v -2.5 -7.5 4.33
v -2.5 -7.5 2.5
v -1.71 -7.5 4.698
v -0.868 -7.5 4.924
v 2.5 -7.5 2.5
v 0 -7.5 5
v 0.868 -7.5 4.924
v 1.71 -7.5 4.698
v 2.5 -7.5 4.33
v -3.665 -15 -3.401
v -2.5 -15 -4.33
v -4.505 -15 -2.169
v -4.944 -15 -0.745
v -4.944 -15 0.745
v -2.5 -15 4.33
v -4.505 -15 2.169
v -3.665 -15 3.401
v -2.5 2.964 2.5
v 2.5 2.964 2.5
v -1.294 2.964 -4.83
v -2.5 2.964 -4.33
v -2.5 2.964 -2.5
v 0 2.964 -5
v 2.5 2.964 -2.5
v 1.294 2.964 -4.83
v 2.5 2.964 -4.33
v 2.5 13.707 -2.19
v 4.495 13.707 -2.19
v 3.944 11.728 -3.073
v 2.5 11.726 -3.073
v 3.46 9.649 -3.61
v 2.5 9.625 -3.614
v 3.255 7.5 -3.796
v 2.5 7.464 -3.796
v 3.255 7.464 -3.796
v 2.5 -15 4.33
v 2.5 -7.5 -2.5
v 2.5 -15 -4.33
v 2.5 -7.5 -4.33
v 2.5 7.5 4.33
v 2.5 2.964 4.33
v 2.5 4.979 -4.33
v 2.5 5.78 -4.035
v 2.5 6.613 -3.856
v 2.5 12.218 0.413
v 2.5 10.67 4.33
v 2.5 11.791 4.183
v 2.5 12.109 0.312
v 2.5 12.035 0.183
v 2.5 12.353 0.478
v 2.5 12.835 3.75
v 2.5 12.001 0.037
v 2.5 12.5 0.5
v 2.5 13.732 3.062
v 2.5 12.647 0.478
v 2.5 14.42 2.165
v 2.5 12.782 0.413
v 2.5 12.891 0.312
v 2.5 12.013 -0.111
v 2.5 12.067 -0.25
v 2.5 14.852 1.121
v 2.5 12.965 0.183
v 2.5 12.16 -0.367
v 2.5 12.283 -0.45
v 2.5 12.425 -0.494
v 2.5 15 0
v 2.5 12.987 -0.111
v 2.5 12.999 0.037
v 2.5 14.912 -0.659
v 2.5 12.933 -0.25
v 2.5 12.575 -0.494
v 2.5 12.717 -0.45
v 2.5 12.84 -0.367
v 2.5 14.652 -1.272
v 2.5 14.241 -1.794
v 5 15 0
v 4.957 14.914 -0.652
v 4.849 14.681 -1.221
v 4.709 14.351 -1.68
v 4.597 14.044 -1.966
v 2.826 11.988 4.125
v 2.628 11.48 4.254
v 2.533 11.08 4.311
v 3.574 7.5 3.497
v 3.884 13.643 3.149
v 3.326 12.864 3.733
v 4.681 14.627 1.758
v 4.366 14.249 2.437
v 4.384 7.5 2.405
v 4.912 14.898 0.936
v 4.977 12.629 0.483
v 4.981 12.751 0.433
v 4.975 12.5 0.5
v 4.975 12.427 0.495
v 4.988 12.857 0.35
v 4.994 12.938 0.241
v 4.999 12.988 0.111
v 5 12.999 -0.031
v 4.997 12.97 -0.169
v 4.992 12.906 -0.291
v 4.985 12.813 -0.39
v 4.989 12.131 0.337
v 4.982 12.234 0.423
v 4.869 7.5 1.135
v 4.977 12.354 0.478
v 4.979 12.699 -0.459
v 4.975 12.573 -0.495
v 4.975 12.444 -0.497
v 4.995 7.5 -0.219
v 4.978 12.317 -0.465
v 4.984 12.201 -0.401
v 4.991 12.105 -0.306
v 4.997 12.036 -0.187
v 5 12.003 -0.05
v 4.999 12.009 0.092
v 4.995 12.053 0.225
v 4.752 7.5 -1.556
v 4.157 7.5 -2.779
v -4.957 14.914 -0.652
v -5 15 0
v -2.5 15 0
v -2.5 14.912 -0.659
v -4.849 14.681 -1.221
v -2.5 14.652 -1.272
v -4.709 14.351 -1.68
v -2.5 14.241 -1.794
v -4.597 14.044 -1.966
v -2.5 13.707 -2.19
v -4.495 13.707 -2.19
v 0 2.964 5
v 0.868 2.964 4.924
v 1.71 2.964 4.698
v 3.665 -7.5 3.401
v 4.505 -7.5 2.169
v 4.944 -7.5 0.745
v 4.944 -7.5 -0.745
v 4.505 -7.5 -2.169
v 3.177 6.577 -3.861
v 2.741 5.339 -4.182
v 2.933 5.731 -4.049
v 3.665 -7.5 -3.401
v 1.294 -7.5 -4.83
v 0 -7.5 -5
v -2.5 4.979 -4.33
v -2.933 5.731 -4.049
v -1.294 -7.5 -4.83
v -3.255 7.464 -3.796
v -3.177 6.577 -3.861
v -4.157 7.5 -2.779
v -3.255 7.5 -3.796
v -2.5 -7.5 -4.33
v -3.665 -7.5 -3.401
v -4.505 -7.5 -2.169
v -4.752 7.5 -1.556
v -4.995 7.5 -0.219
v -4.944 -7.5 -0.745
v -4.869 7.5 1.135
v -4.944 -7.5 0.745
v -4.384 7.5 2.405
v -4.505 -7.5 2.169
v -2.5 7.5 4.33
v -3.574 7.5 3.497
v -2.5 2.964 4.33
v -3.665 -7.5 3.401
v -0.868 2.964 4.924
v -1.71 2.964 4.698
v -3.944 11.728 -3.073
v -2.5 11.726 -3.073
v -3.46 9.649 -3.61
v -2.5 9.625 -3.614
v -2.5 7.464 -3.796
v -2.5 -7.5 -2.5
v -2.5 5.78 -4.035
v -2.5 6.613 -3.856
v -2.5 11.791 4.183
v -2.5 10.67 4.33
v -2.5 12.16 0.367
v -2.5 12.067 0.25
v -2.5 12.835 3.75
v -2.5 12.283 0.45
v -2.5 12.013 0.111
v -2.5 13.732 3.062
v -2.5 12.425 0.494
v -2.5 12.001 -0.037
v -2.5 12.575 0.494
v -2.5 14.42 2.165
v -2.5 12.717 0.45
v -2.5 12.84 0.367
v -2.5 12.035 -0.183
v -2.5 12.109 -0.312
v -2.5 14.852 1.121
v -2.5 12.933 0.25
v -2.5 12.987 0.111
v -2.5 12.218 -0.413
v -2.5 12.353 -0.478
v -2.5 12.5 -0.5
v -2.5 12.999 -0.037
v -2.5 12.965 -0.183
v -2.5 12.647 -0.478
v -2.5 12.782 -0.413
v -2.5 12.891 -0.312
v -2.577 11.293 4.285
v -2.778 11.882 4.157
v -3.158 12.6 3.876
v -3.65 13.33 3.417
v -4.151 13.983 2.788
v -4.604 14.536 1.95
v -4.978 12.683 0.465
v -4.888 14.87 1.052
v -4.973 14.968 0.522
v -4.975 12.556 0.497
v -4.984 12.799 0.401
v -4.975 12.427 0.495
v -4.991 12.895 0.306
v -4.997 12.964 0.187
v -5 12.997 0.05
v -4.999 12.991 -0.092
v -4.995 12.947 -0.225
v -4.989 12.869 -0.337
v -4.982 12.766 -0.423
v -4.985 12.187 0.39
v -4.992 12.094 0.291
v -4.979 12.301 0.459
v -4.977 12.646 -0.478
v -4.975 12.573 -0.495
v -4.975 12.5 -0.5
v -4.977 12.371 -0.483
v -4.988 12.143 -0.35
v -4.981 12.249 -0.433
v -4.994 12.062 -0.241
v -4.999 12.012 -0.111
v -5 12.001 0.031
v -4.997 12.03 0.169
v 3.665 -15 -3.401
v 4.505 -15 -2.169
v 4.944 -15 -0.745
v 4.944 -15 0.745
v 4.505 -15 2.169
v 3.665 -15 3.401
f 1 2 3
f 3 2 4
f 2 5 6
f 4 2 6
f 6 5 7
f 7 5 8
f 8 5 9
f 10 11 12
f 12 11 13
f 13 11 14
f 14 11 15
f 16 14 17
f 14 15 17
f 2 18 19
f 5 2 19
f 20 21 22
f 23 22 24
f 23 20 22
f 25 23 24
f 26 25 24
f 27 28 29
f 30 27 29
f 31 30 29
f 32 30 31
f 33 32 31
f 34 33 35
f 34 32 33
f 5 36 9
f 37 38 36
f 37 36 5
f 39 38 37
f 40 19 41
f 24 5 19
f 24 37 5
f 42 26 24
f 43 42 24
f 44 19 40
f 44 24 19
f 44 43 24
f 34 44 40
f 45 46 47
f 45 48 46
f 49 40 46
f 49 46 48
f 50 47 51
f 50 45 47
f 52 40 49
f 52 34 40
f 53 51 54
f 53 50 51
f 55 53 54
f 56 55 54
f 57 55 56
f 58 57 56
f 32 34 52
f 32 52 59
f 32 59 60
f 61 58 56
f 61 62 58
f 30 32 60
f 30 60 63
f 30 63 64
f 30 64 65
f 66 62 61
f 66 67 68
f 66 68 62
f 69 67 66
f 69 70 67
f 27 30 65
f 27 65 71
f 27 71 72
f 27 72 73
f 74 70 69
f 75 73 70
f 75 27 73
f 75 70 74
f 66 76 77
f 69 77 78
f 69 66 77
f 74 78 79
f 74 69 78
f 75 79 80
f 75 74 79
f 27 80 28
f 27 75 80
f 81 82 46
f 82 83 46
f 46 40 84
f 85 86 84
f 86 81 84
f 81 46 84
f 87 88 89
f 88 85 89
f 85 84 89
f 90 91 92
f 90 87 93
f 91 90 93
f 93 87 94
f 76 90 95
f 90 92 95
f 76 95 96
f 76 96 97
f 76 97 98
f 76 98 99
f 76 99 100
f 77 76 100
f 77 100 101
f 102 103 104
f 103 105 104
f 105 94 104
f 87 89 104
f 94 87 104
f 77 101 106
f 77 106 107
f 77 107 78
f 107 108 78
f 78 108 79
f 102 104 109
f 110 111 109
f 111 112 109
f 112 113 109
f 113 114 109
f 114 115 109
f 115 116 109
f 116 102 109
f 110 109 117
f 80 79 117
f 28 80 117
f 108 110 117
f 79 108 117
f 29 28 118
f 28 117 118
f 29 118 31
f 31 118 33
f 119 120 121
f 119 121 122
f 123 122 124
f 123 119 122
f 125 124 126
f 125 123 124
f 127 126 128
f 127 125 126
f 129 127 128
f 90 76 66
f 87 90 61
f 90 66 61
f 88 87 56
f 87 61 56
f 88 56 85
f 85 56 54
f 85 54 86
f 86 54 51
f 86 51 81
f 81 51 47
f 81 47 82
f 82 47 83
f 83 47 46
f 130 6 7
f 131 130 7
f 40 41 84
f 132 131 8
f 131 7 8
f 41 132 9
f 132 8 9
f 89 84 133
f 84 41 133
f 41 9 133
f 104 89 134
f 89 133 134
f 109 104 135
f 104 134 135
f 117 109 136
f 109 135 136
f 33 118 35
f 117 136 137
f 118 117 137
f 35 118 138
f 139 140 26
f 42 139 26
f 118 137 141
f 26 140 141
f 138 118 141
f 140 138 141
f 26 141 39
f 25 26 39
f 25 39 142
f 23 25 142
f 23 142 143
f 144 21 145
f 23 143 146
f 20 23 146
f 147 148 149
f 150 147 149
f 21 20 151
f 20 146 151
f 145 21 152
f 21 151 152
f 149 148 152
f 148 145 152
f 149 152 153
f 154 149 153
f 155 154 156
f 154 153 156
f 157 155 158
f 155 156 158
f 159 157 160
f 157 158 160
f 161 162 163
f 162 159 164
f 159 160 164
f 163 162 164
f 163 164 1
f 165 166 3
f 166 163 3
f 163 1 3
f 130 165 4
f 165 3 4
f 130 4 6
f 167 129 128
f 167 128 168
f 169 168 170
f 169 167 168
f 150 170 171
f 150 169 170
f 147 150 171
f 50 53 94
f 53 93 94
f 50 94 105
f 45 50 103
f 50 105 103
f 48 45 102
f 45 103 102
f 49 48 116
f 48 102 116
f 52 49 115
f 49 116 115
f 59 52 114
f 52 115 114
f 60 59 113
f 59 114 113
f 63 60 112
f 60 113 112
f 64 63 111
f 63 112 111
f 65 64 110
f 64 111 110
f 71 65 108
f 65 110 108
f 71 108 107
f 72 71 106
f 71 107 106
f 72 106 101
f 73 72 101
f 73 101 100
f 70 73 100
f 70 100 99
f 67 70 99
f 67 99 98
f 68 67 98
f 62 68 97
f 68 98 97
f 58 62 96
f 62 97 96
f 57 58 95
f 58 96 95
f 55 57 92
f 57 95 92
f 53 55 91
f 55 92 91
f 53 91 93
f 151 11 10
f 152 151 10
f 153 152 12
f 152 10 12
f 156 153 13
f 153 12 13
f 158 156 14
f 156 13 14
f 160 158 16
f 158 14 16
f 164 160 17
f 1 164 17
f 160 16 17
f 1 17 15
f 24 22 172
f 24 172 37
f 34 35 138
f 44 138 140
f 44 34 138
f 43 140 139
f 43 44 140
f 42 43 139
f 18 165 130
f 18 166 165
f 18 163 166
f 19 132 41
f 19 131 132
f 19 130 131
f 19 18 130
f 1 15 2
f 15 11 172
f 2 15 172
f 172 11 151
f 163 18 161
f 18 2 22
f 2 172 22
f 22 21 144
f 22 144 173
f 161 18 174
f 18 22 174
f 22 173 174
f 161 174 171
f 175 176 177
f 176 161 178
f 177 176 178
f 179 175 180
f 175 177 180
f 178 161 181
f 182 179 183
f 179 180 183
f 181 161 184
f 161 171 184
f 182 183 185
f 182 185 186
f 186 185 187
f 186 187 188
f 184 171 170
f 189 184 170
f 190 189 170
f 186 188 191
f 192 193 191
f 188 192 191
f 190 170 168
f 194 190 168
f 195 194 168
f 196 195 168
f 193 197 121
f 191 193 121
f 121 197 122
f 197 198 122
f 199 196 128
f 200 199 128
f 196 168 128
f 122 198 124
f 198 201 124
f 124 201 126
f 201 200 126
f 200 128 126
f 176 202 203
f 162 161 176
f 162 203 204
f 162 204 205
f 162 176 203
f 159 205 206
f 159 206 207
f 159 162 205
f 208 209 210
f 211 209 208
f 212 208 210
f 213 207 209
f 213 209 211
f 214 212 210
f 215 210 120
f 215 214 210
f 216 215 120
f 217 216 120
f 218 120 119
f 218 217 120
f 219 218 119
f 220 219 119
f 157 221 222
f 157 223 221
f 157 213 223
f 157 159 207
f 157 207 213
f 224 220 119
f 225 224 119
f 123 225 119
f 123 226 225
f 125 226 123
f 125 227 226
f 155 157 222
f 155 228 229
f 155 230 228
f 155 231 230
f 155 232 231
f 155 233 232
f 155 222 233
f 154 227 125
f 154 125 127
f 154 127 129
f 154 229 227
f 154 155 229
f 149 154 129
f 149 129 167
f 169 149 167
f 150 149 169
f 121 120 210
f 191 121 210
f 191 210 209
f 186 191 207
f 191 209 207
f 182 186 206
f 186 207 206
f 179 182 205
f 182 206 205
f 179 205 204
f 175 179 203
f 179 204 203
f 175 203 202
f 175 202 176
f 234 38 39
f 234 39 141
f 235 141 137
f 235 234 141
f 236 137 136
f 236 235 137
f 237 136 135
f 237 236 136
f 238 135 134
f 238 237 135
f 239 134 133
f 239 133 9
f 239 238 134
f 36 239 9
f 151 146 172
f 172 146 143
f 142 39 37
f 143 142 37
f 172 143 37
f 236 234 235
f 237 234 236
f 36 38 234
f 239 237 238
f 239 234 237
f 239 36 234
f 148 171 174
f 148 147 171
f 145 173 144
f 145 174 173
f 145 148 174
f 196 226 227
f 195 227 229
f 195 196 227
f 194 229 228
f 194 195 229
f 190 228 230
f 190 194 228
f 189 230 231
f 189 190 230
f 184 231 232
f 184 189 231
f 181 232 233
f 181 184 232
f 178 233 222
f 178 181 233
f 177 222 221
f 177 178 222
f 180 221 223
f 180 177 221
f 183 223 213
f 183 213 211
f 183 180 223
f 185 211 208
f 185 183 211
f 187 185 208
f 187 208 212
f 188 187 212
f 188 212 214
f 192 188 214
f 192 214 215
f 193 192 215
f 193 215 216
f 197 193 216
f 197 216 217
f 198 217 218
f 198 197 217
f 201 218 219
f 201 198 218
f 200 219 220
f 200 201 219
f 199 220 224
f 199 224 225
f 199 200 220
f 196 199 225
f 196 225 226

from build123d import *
from build123d.topology import SkipClean

# Parameters (mm, degrees)
BOSS_EXTRUDE1_DEPTH      = 7.5
BOSS_EXTRUDE1_DEPTH_BACK = 7.5
SKETCH1_R                = 5
BOSS_EXTRUDE3_DEPTH      = 7.5
BOSS_EXTRUDE4_START      = 7.5
BOSS_EXTRUDE4_DEPTH      = 7.5
CUT_EXTRUDE2_DEPTH       = 24.58495283
CUT_EXTRUDE2_DEPTH_BACK  = 24.58495283
SKETCH5_W                = 5
SKETCH5_H                = 5
CUT_EXTRUDE4_DEPTH       = 18.5
CUT_EXTRUDE4_DEPTH_BACK  = 7.5
SKETCH14_W               = 0.500000016
SKETCH14_H               = 2.5
CUT_EXTRUDE5_DEPTH       = 7.5
CUT_EXTRUDE5_DEPTH_BACK  = 7.5
CUT_EXTRUDE8_DEPTH       = 7.5
CUT_EXTRUDE8_DEPTH_BACK  = 7.5
SKETCH17_W               = 5
SKETCH17_H               = 4.6


with BuildPart() as part:
    # Sketch1 → Boss-Extrude1 (new, two sides: drawn at the far end of the back side and taken through both)
    with BuildSketch(Plane(origin=(0, 0, 0), x_dir=(1, 0, 0), z_dir=(0, 1, 0)).offset(-BOSS_EXTRUDE1_DEPTH_BACK)):
        Circle(SKETCH1_R)
    extrude(amount=BOSS_EXTRUDE1_DEPTH + BOSS_EXTRUDE1_DEPTH_BACK)

    # Sketch3 → Boss-Extrude3 (add)
    with SkipClean():  # the faces are left unmerged after this step: merging them gives an invalid solid
        with BuildSketch(Plane(origin=(0, 7.5, 0), x_dir=(1, 0, 0), z_dir=(0, 1, 0))):
            with BuildLine():
                Line((-2.5, 4.330127019), (-2.5, -4.330127019))
                ThreePointArc((-2.5, -4.330127019), (-5, 0), (-2.5, 4.330127019))
            make_face()
            with BuildLine():
                Line((2.5, 4.330127019), (2.5, -4.330127019))
                ThreePointArc((2.5, -4.330127019), (5, 0), (2.5, 4.330127019))
            make_face()
        extrude(amount=BOSS_EXTRUDE3_DEPTH)

    # Sketch4 → Boss-Extrude4 (add)
    with SkipClean():  # the faces are left unmerged after this step: merging them gives an invalid solid
        with BuildSketch(Plane.XZ.offset(7.5).offset(BOSS_EXTRUDE4_START)):
            with BuildLine():
                Line((-2.5, 4.330127019), (-2.5, -4.330127019))
                ThreePointArc((-2.5, -4.330127019), (-5, 0), (-2.5, 4.330127019))
            make_face()
            with BuildLine():
                Line((2.5, 4.330127019), (2.5, -4.330127019))
                ThreePointArc((2.5, -4.330127019), (5, 0), (2.5, 4.330127019))
            make_face()
        extrude(amount=-BOSS_EXTRUDE4_DEPTH)

    # Sketch5 → Cut-Extrude2 (cut, two sides: drawn at the far end of the back side and taken through both)
    with SkipClean():  # the faces are left unmerged after this step: merging them gives an invalid solid
        with BuildSketch(Plane.XZ.offset(7.5).offset(-CUT_EXTRUDE2_DEPTH_BACK)):
            Rectangle(SKETCH5_W, SKETCH5_H)
        extrude(amount=CUT_EXTRUDE2_DEPTH + CUT_EXTRUDE2_DEPTH_BACK, mode=Mode.SUBTRACT)

    # Sketch10 → Cut-Extrude4 (cut, two sides: drawn at the far end of the back side and taken through both)
    with SkipClean():  # the faces are left unmerged after this step: merging them gives an invalid solid
        with BuildSketch(Plane(origin=(-2.5, 0, 0), x_dir=(0, 0, -1), z_dir=(1, 0, 0)).offset(-CUT_EXTRUDE4_DEPTH_BACK)):
            with BuildLine():
                Line((-4.33012702, 10.66987298), (-4.331858603, 15.169872647))
                Line((-4.331858603, 15.169872647), (4.328395437, 15.169872647))
                Line((4.328395437, 15.169872647), (4.33012702, 10.66987298))
                ThreePointArc((4.33012702, 10.66987298), (0, 15), (-4.33012702, 10.66987298))
            make_face()
        extrude(amount=CUT_EXTRUDE4_DEPTH + CUT_EXTRUDE4_DEPTH_BACK, mode=Mode.SUBTRACT)


with BuildPart() as cut_extrude4_piece_1:
    # of the separate pieces the step leaves, piece 1, a body of its own (cut_extrude4_pieces)
    add(part.part.solids().sort_by_distance((5, 0, 0))[0])

    # Sketch14 → #97 (0.03937008) Diameter Hole1 (revolve, cut)
    with SkipClean():  # the faces are left unmerged after this step: merging them gives an invalid solid
        with BuildSketch(Plane(origin=(2.5, 12.5, 0), x_dir=(0, 0, 1), z_dir=(0, 1, 0))):
            with Locations((0.250000008, 1.25)):
                Rectangle(SKETCH14_W, SKETCH14_H)
        revolve(axis=Axis((-3.85, 12.5, 0), (1, 0, 0)), mode=Mode.SUBTRACT)

    # Sketch15 → #97 (0.03937008) Diameter Hole2 (revolve, cut)
    with SkipClean():  # the faces are left unmerged after this step: merging them gives an invalid solid
        with BuildSketch(Plane(origin=(2.5, 12.5, 0), x_dir=(0, 0, -1), z_dir=(0, 1, 0))):
            Polygon((0, 0), (0, 10.300430319), (0.500000016, 10), (0.500000016, 0), align=None)
        revolve(axis=Axis((8.85, 12.5, 0), (-1, 0, 0)), mode=Mode.SUBTRACT)


with BuildPart() as cut_extrude4_piece_2:
    # of the separate pieces the step leaves, piece 2, a body of its own (cut_extrude4_pieces)
    add(part.part.solids().sort_by_distance((2.502883751, 15, -4.328460803))[0])


with BuildPart() as cut_extrude4_piece_3:
    # of the separate pieces the step leaves, piece 3, a body of its own (cut_extrude4_pieces)
    add(part.part.solids().sort_by_distance((-2.5, 15, -4.330127019))[0])


with BuildPart() as cut_extrude5_tool:
    # Sketch16 → Cut-Extrude5 (new, two sides: drawn at the far end of the back side and taken through both)
    with SkipClean():  # the faces are left unmerged after this step: merging them gives an invalid solid
        with BuildSketch(Plane(origin=(-2.5, 0, 0), x_dir=(0, 0, -1), z_dir=(1, 0, 0)).offset(-CUT_EXTRUDE5_DEPTH_BACK)):
            with BuildLine():
                Line((5.450138396, 3.309889021), (7.392049741, 3.309889021))
                Line((7.392049741, 3.309889021), (7.392049741, 15))
                Line((7.392049741, 15), (0, 15))
                ThreePointArc((0, 15), (1.271548544, 14.652478641), (2.189584866, 13.70653144))
                ThreePointArc((2.189584866, 13.70653144), (3.387744198, 10.686815519), (3.795708462, 7.463799045))
                ThreePointArc((3.795708462, 7.463799045), (4.224533696, 5.228172349), (5.450138396, 3.309889021))
            make_face()
        extrude(amount=CUT_EXTRUDE5_DEPTH + CUT_EXTRUDE5_DEPTH_BACK)


with BuildPart() as cut_extrude4_piece_1_1:
    with SkipClean():  # the faces are left unmerged after this step: merging them gives an invalid solid
        add(cut_extrude4_piece_1.part)

        # Cut-Extrude5: cut by cut_extrude5_tool
        add(cut_extrude5_tool.part, mode=Mode.SUBTRACT)

    # Sketch17 → Cut-Extrude8 (cut, two sides: drawn at the far end of the back side and taken through both)
    with SkipClean():  # the faces are left unmerged after this step: merging them gives an invalid solid
        with BuildSketch(Plane.XY.offset(-CUT_EXTRUDE8_DEPTH_BACK)):
            with Locations((0, 5.263799045)):
                Rectangle(SKETCH17_W, SKETCH17_H)
        extrude(amount=CUT_EXTRUDE8_DEPTH + CUT_EXTRUDE8_DEPTH_BACK, mode=Mode.SUBTRACT)


with BuildPart() as cut_extrude4_piece_2_1:
    with SkipClean():  # the faces are left unmerged after this step: merging them gives an invalid solid
        add(cut_extrude4_piece_2.part)

        # Cut-Extrude5: cut by cut_extrude5_tool
        add(cut_extrude5_tool.part, mode=Mode.SUBTRACT)


with BuildPart() as cut_extrude4_piece_3_1:
    with SkipClean():  # the faces are left unmerged after this step: merging them gives an invalid solid
        add(cut_extrude4_piece_3.part)

        # Cut-Extrude5: cut by cut_extrude5_tool
        add(cut_extrude5_tool.part, mode=Mode.SUBTRACT)


solid = cut_extrude4_piece_1_1.part
